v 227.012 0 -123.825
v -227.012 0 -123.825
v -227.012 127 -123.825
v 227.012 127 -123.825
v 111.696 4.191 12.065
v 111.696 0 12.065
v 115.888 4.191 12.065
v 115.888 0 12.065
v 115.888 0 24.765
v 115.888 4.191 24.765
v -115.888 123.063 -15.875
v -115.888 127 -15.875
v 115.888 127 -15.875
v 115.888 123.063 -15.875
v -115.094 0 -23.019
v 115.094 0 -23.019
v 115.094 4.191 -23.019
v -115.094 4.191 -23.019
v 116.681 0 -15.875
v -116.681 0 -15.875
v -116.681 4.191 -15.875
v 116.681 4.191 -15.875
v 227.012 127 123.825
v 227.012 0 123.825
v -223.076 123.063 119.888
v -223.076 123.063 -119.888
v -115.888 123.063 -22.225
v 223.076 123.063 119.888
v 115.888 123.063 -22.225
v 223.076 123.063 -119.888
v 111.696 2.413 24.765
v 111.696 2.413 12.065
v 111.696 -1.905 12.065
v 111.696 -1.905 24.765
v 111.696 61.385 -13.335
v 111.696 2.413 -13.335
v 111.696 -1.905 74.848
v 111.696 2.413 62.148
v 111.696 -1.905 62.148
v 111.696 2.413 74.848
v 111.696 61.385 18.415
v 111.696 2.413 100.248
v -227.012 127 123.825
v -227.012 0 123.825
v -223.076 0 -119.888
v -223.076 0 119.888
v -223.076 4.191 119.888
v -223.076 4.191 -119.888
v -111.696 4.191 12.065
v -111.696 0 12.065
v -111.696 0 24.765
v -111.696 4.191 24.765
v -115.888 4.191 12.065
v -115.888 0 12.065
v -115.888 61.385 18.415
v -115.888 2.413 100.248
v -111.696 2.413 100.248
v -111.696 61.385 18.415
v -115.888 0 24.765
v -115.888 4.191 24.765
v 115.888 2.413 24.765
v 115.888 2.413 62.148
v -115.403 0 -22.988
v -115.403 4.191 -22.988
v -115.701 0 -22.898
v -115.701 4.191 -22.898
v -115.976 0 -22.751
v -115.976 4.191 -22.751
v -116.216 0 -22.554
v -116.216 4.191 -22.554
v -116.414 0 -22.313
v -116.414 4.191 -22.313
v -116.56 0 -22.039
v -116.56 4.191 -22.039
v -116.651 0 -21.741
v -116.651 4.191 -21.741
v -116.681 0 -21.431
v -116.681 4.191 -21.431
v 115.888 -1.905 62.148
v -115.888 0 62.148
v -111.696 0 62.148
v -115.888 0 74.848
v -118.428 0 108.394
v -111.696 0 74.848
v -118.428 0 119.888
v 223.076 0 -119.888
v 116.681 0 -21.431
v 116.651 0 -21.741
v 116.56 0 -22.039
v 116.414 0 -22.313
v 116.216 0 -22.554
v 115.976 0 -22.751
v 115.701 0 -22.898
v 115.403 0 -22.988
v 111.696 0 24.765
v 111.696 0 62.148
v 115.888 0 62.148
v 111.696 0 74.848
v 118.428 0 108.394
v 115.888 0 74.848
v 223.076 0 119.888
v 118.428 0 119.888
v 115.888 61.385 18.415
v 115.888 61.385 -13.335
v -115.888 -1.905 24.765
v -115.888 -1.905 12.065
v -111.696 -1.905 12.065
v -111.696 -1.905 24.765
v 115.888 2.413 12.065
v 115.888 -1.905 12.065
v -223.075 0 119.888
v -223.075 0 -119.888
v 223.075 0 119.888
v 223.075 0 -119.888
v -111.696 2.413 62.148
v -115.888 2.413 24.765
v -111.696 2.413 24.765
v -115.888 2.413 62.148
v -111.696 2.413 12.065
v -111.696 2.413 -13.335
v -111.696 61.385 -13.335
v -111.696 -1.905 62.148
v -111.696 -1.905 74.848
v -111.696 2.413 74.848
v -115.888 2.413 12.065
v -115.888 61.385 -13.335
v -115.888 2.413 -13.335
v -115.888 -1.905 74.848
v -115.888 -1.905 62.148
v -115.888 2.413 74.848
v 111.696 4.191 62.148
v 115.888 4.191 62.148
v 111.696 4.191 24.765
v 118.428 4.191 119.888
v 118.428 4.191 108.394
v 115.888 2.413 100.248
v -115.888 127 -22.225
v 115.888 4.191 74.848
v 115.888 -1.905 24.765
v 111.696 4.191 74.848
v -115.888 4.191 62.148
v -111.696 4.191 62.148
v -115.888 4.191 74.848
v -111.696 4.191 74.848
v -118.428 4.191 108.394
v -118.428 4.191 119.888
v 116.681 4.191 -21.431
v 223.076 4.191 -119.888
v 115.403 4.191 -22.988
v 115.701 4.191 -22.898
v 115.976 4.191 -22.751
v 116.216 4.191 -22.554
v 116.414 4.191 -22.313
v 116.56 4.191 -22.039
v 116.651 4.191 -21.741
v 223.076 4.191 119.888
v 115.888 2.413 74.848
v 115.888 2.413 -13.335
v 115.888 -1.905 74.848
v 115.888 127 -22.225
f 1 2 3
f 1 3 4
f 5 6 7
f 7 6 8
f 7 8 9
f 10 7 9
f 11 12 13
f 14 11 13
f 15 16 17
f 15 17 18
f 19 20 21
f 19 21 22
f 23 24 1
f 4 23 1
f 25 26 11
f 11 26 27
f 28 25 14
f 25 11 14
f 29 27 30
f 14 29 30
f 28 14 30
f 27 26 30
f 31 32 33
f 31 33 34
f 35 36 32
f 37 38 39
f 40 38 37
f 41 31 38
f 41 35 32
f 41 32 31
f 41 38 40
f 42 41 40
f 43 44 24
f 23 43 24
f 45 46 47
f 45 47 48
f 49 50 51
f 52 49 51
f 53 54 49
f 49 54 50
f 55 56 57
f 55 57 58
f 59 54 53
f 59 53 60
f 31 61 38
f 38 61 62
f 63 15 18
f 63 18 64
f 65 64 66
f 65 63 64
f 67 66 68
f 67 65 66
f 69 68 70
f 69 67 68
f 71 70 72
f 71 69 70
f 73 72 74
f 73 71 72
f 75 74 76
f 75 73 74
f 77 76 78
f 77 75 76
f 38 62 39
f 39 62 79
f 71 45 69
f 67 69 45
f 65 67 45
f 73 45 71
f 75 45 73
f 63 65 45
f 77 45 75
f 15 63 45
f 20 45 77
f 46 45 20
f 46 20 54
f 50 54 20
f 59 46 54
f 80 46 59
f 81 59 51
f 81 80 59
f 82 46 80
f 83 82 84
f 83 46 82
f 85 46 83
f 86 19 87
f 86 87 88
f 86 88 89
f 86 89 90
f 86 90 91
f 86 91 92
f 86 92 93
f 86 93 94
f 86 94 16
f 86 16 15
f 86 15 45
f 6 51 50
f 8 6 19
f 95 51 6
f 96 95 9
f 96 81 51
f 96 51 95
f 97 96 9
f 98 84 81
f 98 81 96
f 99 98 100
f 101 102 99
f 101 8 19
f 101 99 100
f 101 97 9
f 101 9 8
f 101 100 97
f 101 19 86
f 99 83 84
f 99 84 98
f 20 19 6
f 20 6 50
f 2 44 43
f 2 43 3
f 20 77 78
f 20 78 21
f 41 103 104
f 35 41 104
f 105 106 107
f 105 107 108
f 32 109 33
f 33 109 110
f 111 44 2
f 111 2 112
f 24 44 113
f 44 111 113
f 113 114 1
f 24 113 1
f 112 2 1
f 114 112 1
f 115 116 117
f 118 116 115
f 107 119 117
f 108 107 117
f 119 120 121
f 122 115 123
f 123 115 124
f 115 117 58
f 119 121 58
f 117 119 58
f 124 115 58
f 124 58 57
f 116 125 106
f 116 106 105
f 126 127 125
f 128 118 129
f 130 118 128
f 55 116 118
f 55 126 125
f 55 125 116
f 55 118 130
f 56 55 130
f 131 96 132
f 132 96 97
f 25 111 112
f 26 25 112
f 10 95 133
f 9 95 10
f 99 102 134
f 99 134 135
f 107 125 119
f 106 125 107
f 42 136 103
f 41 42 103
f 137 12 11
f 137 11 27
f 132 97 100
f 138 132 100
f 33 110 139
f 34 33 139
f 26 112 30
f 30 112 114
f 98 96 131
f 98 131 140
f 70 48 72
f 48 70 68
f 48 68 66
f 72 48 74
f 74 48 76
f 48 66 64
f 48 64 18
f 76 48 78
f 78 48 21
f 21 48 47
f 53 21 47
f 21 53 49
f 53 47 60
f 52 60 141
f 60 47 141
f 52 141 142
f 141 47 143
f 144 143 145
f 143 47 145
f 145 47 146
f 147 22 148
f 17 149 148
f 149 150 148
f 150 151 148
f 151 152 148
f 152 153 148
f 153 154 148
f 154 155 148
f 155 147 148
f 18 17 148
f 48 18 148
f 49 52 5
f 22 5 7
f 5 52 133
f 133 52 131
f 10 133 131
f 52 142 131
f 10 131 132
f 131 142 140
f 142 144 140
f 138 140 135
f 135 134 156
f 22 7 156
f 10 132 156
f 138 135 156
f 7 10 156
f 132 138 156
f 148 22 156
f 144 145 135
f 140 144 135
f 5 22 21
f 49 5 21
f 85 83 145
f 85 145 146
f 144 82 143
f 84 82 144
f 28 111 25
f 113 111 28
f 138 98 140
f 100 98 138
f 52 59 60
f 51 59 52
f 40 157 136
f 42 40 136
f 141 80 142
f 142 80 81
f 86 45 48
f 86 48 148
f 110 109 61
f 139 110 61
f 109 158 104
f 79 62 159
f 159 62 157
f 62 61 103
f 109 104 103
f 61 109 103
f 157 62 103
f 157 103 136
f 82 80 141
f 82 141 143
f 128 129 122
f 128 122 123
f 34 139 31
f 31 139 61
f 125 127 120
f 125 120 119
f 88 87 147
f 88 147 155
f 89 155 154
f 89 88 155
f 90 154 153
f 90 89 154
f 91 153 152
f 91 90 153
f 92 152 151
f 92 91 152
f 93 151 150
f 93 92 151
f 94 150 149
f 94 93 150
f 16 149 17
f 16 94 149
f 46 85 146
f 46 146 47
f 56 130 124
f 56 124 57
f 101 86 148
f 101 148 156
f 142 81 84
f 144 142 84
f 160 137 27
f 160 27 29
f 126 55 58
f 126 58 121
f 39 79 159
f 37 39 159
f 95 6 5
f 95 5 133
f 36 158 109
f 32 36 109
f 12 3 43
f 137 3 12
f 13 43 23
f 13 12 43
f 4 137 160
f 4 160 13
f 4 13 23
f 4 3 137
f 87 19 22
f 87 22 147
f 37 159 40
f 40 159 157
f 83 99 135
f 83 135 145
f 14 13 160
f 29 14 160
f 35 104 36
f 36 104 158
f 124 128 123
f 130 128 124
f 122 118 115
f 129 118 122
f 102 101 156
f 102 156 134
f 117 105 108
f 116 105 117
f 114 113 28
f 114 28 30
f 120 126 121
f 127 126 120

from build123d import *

# Parameters (mm, degrees)
SKETCH1_W           = 454.025
SKETCH1_H           = 247.65
BOSS_EXTRUDE1_DEPTH = 127
SHELL1_T            = -3.937
SKETCH3_W           = 231.775
SKETCH3_H           = 6.35
CUT_EXTRUDE1_DEPTH  = 128
BOSS_EXTRUDE2_DEPTH = 4.191
BOSS_EXTRUDE3_DEPTH = 4.191
SKETCH6_W           = 4.191
SKETCH6_H           = 12.7
CUT_EXTRUDE2_DEPTH  = 5.08


with BuildPart() as part:
    # Sketch1 → Boss-Extrude1 (new body)
    with BuildSketch(Plane(origin=(0, 0, 0), x_dir=(1, 0, 0), z_dir=(0, 1, 0))):
        Rectangle(SKETCH1_W, SKETCH1_H)
    extrude(amount=BOSS_EXTRUDE1_DEPTH)

    # Shell1
    shell1_openings = [part.faces().sort_by_distance(p)[0] for p in [
        (0, 0, 0),
    ]]
    offset(amount=SHELL1_T, openings=shell1_openings, kind=Kind.INTERSECTION)

    # Sketch3 → Cut-Extrude1 (cut, through all)
    with BuildSketch(Plane(origin=(0, 127, 0), x_dir=(1, 0, 0), z_dir=(0, 1, 0))):
        with Locations((0, 19.05)):
            Rectangle(SKETCH3_W, SKETCH3_H)
    extrude(amount=-CUT_EXTRUDE1_DEPTH, mode=Mode.SUBTRACT)


with BuildPart() as body_2:
    # Sketch4 → Boss-Extrude2 (new body)
    with BuildSketch(Plane.XZ):
        Polygon((118.4275, 119.888), (118.4275, 108.393628317), (-118.4275, 108.393628317), (-118.4275, 119.888), (-223.0755, 119.888), (-223.0755, -119.888), (223.0755, -119.888), (223.0755, 119.888), align=None)
    extrude(amount=-BOSS_EXTRUDE2_DEPTH)

    # Sketch6 → Cut-Extrude2 (cut)
    with BuildSketch(Plane.XZ):
        with Locations((-113.792, 68.497674129)):
            Rectangle(SKETCH6_W, SKETCH6_H)
        with Locations((-113.792, 18.415)):
            Rectangle(SKETCH6_W, SKETCH6_H)
        with Locations((113.792, 18.415)):
            Rectangle(SKETCH6_W, SKETCH6_H)
        with Locations((113.792, 68.497674129)):
            Rectangle(SKETCH6_W, SKETCH6_H)
        with BuildLine():
            Line((-116.68125, -21.43125), (-116.68125, -15.875))
            Line((-116.68125, -15.875), (116.68125, -15.875))
            Line((116.68125, -15.875), (116.68125, -21.43125))
            ThreePointArc((116.68125, -21.43125), (116.216282015, -22.553782015), (115.09375, -23.01875))
            Line((115.09375, -23.01875), (-115.09375, -23.01875))
            ThreePointArc((-115.09375, -23.01875), (-116.216282015, -22.553782015), (-116.68125, -21.43125))
        make_face()
    extrude(amount=-CUT_EXTRUDE2_DEPTH, mode=Mode.SUBTRACT)


with BuildPart() as body_3:
    # Sketch5 → Boss-Extrude3 (new body)
    with BuildSketch(Plane(origin=(-115.8875, 0, 0), x_dir=(0, 0, -1), z_dir=(1, 0, 0))):
        Polygon((-100.247674129, 2.413), (-18.415, 61.384810708), (13.335, 61.384810708), (13.335, 2.413), (-12.065, 2.413), (-12.065, -1.905), (-24.765, -1.905), (-24.765, 2.413), (-62.147674129, 2.413), (-62.147674129, -1.905), (-74.847674129, -1.905), (-74.847674129, 2.413), align=None)
    extrude(amount=BOSS_EXTRUDE3_DEPTH)


with BuildPart() as body_4:
    # Mirror2: mirrored copy
    add(body_3.part.mirror(Plane(origin=(0, 0, 0), x_dir=(0, 0, 1), z_dir=(1, 0, 0))))


solid = Compound([part.part, body_2.part, body_3.part, body_4.part])
